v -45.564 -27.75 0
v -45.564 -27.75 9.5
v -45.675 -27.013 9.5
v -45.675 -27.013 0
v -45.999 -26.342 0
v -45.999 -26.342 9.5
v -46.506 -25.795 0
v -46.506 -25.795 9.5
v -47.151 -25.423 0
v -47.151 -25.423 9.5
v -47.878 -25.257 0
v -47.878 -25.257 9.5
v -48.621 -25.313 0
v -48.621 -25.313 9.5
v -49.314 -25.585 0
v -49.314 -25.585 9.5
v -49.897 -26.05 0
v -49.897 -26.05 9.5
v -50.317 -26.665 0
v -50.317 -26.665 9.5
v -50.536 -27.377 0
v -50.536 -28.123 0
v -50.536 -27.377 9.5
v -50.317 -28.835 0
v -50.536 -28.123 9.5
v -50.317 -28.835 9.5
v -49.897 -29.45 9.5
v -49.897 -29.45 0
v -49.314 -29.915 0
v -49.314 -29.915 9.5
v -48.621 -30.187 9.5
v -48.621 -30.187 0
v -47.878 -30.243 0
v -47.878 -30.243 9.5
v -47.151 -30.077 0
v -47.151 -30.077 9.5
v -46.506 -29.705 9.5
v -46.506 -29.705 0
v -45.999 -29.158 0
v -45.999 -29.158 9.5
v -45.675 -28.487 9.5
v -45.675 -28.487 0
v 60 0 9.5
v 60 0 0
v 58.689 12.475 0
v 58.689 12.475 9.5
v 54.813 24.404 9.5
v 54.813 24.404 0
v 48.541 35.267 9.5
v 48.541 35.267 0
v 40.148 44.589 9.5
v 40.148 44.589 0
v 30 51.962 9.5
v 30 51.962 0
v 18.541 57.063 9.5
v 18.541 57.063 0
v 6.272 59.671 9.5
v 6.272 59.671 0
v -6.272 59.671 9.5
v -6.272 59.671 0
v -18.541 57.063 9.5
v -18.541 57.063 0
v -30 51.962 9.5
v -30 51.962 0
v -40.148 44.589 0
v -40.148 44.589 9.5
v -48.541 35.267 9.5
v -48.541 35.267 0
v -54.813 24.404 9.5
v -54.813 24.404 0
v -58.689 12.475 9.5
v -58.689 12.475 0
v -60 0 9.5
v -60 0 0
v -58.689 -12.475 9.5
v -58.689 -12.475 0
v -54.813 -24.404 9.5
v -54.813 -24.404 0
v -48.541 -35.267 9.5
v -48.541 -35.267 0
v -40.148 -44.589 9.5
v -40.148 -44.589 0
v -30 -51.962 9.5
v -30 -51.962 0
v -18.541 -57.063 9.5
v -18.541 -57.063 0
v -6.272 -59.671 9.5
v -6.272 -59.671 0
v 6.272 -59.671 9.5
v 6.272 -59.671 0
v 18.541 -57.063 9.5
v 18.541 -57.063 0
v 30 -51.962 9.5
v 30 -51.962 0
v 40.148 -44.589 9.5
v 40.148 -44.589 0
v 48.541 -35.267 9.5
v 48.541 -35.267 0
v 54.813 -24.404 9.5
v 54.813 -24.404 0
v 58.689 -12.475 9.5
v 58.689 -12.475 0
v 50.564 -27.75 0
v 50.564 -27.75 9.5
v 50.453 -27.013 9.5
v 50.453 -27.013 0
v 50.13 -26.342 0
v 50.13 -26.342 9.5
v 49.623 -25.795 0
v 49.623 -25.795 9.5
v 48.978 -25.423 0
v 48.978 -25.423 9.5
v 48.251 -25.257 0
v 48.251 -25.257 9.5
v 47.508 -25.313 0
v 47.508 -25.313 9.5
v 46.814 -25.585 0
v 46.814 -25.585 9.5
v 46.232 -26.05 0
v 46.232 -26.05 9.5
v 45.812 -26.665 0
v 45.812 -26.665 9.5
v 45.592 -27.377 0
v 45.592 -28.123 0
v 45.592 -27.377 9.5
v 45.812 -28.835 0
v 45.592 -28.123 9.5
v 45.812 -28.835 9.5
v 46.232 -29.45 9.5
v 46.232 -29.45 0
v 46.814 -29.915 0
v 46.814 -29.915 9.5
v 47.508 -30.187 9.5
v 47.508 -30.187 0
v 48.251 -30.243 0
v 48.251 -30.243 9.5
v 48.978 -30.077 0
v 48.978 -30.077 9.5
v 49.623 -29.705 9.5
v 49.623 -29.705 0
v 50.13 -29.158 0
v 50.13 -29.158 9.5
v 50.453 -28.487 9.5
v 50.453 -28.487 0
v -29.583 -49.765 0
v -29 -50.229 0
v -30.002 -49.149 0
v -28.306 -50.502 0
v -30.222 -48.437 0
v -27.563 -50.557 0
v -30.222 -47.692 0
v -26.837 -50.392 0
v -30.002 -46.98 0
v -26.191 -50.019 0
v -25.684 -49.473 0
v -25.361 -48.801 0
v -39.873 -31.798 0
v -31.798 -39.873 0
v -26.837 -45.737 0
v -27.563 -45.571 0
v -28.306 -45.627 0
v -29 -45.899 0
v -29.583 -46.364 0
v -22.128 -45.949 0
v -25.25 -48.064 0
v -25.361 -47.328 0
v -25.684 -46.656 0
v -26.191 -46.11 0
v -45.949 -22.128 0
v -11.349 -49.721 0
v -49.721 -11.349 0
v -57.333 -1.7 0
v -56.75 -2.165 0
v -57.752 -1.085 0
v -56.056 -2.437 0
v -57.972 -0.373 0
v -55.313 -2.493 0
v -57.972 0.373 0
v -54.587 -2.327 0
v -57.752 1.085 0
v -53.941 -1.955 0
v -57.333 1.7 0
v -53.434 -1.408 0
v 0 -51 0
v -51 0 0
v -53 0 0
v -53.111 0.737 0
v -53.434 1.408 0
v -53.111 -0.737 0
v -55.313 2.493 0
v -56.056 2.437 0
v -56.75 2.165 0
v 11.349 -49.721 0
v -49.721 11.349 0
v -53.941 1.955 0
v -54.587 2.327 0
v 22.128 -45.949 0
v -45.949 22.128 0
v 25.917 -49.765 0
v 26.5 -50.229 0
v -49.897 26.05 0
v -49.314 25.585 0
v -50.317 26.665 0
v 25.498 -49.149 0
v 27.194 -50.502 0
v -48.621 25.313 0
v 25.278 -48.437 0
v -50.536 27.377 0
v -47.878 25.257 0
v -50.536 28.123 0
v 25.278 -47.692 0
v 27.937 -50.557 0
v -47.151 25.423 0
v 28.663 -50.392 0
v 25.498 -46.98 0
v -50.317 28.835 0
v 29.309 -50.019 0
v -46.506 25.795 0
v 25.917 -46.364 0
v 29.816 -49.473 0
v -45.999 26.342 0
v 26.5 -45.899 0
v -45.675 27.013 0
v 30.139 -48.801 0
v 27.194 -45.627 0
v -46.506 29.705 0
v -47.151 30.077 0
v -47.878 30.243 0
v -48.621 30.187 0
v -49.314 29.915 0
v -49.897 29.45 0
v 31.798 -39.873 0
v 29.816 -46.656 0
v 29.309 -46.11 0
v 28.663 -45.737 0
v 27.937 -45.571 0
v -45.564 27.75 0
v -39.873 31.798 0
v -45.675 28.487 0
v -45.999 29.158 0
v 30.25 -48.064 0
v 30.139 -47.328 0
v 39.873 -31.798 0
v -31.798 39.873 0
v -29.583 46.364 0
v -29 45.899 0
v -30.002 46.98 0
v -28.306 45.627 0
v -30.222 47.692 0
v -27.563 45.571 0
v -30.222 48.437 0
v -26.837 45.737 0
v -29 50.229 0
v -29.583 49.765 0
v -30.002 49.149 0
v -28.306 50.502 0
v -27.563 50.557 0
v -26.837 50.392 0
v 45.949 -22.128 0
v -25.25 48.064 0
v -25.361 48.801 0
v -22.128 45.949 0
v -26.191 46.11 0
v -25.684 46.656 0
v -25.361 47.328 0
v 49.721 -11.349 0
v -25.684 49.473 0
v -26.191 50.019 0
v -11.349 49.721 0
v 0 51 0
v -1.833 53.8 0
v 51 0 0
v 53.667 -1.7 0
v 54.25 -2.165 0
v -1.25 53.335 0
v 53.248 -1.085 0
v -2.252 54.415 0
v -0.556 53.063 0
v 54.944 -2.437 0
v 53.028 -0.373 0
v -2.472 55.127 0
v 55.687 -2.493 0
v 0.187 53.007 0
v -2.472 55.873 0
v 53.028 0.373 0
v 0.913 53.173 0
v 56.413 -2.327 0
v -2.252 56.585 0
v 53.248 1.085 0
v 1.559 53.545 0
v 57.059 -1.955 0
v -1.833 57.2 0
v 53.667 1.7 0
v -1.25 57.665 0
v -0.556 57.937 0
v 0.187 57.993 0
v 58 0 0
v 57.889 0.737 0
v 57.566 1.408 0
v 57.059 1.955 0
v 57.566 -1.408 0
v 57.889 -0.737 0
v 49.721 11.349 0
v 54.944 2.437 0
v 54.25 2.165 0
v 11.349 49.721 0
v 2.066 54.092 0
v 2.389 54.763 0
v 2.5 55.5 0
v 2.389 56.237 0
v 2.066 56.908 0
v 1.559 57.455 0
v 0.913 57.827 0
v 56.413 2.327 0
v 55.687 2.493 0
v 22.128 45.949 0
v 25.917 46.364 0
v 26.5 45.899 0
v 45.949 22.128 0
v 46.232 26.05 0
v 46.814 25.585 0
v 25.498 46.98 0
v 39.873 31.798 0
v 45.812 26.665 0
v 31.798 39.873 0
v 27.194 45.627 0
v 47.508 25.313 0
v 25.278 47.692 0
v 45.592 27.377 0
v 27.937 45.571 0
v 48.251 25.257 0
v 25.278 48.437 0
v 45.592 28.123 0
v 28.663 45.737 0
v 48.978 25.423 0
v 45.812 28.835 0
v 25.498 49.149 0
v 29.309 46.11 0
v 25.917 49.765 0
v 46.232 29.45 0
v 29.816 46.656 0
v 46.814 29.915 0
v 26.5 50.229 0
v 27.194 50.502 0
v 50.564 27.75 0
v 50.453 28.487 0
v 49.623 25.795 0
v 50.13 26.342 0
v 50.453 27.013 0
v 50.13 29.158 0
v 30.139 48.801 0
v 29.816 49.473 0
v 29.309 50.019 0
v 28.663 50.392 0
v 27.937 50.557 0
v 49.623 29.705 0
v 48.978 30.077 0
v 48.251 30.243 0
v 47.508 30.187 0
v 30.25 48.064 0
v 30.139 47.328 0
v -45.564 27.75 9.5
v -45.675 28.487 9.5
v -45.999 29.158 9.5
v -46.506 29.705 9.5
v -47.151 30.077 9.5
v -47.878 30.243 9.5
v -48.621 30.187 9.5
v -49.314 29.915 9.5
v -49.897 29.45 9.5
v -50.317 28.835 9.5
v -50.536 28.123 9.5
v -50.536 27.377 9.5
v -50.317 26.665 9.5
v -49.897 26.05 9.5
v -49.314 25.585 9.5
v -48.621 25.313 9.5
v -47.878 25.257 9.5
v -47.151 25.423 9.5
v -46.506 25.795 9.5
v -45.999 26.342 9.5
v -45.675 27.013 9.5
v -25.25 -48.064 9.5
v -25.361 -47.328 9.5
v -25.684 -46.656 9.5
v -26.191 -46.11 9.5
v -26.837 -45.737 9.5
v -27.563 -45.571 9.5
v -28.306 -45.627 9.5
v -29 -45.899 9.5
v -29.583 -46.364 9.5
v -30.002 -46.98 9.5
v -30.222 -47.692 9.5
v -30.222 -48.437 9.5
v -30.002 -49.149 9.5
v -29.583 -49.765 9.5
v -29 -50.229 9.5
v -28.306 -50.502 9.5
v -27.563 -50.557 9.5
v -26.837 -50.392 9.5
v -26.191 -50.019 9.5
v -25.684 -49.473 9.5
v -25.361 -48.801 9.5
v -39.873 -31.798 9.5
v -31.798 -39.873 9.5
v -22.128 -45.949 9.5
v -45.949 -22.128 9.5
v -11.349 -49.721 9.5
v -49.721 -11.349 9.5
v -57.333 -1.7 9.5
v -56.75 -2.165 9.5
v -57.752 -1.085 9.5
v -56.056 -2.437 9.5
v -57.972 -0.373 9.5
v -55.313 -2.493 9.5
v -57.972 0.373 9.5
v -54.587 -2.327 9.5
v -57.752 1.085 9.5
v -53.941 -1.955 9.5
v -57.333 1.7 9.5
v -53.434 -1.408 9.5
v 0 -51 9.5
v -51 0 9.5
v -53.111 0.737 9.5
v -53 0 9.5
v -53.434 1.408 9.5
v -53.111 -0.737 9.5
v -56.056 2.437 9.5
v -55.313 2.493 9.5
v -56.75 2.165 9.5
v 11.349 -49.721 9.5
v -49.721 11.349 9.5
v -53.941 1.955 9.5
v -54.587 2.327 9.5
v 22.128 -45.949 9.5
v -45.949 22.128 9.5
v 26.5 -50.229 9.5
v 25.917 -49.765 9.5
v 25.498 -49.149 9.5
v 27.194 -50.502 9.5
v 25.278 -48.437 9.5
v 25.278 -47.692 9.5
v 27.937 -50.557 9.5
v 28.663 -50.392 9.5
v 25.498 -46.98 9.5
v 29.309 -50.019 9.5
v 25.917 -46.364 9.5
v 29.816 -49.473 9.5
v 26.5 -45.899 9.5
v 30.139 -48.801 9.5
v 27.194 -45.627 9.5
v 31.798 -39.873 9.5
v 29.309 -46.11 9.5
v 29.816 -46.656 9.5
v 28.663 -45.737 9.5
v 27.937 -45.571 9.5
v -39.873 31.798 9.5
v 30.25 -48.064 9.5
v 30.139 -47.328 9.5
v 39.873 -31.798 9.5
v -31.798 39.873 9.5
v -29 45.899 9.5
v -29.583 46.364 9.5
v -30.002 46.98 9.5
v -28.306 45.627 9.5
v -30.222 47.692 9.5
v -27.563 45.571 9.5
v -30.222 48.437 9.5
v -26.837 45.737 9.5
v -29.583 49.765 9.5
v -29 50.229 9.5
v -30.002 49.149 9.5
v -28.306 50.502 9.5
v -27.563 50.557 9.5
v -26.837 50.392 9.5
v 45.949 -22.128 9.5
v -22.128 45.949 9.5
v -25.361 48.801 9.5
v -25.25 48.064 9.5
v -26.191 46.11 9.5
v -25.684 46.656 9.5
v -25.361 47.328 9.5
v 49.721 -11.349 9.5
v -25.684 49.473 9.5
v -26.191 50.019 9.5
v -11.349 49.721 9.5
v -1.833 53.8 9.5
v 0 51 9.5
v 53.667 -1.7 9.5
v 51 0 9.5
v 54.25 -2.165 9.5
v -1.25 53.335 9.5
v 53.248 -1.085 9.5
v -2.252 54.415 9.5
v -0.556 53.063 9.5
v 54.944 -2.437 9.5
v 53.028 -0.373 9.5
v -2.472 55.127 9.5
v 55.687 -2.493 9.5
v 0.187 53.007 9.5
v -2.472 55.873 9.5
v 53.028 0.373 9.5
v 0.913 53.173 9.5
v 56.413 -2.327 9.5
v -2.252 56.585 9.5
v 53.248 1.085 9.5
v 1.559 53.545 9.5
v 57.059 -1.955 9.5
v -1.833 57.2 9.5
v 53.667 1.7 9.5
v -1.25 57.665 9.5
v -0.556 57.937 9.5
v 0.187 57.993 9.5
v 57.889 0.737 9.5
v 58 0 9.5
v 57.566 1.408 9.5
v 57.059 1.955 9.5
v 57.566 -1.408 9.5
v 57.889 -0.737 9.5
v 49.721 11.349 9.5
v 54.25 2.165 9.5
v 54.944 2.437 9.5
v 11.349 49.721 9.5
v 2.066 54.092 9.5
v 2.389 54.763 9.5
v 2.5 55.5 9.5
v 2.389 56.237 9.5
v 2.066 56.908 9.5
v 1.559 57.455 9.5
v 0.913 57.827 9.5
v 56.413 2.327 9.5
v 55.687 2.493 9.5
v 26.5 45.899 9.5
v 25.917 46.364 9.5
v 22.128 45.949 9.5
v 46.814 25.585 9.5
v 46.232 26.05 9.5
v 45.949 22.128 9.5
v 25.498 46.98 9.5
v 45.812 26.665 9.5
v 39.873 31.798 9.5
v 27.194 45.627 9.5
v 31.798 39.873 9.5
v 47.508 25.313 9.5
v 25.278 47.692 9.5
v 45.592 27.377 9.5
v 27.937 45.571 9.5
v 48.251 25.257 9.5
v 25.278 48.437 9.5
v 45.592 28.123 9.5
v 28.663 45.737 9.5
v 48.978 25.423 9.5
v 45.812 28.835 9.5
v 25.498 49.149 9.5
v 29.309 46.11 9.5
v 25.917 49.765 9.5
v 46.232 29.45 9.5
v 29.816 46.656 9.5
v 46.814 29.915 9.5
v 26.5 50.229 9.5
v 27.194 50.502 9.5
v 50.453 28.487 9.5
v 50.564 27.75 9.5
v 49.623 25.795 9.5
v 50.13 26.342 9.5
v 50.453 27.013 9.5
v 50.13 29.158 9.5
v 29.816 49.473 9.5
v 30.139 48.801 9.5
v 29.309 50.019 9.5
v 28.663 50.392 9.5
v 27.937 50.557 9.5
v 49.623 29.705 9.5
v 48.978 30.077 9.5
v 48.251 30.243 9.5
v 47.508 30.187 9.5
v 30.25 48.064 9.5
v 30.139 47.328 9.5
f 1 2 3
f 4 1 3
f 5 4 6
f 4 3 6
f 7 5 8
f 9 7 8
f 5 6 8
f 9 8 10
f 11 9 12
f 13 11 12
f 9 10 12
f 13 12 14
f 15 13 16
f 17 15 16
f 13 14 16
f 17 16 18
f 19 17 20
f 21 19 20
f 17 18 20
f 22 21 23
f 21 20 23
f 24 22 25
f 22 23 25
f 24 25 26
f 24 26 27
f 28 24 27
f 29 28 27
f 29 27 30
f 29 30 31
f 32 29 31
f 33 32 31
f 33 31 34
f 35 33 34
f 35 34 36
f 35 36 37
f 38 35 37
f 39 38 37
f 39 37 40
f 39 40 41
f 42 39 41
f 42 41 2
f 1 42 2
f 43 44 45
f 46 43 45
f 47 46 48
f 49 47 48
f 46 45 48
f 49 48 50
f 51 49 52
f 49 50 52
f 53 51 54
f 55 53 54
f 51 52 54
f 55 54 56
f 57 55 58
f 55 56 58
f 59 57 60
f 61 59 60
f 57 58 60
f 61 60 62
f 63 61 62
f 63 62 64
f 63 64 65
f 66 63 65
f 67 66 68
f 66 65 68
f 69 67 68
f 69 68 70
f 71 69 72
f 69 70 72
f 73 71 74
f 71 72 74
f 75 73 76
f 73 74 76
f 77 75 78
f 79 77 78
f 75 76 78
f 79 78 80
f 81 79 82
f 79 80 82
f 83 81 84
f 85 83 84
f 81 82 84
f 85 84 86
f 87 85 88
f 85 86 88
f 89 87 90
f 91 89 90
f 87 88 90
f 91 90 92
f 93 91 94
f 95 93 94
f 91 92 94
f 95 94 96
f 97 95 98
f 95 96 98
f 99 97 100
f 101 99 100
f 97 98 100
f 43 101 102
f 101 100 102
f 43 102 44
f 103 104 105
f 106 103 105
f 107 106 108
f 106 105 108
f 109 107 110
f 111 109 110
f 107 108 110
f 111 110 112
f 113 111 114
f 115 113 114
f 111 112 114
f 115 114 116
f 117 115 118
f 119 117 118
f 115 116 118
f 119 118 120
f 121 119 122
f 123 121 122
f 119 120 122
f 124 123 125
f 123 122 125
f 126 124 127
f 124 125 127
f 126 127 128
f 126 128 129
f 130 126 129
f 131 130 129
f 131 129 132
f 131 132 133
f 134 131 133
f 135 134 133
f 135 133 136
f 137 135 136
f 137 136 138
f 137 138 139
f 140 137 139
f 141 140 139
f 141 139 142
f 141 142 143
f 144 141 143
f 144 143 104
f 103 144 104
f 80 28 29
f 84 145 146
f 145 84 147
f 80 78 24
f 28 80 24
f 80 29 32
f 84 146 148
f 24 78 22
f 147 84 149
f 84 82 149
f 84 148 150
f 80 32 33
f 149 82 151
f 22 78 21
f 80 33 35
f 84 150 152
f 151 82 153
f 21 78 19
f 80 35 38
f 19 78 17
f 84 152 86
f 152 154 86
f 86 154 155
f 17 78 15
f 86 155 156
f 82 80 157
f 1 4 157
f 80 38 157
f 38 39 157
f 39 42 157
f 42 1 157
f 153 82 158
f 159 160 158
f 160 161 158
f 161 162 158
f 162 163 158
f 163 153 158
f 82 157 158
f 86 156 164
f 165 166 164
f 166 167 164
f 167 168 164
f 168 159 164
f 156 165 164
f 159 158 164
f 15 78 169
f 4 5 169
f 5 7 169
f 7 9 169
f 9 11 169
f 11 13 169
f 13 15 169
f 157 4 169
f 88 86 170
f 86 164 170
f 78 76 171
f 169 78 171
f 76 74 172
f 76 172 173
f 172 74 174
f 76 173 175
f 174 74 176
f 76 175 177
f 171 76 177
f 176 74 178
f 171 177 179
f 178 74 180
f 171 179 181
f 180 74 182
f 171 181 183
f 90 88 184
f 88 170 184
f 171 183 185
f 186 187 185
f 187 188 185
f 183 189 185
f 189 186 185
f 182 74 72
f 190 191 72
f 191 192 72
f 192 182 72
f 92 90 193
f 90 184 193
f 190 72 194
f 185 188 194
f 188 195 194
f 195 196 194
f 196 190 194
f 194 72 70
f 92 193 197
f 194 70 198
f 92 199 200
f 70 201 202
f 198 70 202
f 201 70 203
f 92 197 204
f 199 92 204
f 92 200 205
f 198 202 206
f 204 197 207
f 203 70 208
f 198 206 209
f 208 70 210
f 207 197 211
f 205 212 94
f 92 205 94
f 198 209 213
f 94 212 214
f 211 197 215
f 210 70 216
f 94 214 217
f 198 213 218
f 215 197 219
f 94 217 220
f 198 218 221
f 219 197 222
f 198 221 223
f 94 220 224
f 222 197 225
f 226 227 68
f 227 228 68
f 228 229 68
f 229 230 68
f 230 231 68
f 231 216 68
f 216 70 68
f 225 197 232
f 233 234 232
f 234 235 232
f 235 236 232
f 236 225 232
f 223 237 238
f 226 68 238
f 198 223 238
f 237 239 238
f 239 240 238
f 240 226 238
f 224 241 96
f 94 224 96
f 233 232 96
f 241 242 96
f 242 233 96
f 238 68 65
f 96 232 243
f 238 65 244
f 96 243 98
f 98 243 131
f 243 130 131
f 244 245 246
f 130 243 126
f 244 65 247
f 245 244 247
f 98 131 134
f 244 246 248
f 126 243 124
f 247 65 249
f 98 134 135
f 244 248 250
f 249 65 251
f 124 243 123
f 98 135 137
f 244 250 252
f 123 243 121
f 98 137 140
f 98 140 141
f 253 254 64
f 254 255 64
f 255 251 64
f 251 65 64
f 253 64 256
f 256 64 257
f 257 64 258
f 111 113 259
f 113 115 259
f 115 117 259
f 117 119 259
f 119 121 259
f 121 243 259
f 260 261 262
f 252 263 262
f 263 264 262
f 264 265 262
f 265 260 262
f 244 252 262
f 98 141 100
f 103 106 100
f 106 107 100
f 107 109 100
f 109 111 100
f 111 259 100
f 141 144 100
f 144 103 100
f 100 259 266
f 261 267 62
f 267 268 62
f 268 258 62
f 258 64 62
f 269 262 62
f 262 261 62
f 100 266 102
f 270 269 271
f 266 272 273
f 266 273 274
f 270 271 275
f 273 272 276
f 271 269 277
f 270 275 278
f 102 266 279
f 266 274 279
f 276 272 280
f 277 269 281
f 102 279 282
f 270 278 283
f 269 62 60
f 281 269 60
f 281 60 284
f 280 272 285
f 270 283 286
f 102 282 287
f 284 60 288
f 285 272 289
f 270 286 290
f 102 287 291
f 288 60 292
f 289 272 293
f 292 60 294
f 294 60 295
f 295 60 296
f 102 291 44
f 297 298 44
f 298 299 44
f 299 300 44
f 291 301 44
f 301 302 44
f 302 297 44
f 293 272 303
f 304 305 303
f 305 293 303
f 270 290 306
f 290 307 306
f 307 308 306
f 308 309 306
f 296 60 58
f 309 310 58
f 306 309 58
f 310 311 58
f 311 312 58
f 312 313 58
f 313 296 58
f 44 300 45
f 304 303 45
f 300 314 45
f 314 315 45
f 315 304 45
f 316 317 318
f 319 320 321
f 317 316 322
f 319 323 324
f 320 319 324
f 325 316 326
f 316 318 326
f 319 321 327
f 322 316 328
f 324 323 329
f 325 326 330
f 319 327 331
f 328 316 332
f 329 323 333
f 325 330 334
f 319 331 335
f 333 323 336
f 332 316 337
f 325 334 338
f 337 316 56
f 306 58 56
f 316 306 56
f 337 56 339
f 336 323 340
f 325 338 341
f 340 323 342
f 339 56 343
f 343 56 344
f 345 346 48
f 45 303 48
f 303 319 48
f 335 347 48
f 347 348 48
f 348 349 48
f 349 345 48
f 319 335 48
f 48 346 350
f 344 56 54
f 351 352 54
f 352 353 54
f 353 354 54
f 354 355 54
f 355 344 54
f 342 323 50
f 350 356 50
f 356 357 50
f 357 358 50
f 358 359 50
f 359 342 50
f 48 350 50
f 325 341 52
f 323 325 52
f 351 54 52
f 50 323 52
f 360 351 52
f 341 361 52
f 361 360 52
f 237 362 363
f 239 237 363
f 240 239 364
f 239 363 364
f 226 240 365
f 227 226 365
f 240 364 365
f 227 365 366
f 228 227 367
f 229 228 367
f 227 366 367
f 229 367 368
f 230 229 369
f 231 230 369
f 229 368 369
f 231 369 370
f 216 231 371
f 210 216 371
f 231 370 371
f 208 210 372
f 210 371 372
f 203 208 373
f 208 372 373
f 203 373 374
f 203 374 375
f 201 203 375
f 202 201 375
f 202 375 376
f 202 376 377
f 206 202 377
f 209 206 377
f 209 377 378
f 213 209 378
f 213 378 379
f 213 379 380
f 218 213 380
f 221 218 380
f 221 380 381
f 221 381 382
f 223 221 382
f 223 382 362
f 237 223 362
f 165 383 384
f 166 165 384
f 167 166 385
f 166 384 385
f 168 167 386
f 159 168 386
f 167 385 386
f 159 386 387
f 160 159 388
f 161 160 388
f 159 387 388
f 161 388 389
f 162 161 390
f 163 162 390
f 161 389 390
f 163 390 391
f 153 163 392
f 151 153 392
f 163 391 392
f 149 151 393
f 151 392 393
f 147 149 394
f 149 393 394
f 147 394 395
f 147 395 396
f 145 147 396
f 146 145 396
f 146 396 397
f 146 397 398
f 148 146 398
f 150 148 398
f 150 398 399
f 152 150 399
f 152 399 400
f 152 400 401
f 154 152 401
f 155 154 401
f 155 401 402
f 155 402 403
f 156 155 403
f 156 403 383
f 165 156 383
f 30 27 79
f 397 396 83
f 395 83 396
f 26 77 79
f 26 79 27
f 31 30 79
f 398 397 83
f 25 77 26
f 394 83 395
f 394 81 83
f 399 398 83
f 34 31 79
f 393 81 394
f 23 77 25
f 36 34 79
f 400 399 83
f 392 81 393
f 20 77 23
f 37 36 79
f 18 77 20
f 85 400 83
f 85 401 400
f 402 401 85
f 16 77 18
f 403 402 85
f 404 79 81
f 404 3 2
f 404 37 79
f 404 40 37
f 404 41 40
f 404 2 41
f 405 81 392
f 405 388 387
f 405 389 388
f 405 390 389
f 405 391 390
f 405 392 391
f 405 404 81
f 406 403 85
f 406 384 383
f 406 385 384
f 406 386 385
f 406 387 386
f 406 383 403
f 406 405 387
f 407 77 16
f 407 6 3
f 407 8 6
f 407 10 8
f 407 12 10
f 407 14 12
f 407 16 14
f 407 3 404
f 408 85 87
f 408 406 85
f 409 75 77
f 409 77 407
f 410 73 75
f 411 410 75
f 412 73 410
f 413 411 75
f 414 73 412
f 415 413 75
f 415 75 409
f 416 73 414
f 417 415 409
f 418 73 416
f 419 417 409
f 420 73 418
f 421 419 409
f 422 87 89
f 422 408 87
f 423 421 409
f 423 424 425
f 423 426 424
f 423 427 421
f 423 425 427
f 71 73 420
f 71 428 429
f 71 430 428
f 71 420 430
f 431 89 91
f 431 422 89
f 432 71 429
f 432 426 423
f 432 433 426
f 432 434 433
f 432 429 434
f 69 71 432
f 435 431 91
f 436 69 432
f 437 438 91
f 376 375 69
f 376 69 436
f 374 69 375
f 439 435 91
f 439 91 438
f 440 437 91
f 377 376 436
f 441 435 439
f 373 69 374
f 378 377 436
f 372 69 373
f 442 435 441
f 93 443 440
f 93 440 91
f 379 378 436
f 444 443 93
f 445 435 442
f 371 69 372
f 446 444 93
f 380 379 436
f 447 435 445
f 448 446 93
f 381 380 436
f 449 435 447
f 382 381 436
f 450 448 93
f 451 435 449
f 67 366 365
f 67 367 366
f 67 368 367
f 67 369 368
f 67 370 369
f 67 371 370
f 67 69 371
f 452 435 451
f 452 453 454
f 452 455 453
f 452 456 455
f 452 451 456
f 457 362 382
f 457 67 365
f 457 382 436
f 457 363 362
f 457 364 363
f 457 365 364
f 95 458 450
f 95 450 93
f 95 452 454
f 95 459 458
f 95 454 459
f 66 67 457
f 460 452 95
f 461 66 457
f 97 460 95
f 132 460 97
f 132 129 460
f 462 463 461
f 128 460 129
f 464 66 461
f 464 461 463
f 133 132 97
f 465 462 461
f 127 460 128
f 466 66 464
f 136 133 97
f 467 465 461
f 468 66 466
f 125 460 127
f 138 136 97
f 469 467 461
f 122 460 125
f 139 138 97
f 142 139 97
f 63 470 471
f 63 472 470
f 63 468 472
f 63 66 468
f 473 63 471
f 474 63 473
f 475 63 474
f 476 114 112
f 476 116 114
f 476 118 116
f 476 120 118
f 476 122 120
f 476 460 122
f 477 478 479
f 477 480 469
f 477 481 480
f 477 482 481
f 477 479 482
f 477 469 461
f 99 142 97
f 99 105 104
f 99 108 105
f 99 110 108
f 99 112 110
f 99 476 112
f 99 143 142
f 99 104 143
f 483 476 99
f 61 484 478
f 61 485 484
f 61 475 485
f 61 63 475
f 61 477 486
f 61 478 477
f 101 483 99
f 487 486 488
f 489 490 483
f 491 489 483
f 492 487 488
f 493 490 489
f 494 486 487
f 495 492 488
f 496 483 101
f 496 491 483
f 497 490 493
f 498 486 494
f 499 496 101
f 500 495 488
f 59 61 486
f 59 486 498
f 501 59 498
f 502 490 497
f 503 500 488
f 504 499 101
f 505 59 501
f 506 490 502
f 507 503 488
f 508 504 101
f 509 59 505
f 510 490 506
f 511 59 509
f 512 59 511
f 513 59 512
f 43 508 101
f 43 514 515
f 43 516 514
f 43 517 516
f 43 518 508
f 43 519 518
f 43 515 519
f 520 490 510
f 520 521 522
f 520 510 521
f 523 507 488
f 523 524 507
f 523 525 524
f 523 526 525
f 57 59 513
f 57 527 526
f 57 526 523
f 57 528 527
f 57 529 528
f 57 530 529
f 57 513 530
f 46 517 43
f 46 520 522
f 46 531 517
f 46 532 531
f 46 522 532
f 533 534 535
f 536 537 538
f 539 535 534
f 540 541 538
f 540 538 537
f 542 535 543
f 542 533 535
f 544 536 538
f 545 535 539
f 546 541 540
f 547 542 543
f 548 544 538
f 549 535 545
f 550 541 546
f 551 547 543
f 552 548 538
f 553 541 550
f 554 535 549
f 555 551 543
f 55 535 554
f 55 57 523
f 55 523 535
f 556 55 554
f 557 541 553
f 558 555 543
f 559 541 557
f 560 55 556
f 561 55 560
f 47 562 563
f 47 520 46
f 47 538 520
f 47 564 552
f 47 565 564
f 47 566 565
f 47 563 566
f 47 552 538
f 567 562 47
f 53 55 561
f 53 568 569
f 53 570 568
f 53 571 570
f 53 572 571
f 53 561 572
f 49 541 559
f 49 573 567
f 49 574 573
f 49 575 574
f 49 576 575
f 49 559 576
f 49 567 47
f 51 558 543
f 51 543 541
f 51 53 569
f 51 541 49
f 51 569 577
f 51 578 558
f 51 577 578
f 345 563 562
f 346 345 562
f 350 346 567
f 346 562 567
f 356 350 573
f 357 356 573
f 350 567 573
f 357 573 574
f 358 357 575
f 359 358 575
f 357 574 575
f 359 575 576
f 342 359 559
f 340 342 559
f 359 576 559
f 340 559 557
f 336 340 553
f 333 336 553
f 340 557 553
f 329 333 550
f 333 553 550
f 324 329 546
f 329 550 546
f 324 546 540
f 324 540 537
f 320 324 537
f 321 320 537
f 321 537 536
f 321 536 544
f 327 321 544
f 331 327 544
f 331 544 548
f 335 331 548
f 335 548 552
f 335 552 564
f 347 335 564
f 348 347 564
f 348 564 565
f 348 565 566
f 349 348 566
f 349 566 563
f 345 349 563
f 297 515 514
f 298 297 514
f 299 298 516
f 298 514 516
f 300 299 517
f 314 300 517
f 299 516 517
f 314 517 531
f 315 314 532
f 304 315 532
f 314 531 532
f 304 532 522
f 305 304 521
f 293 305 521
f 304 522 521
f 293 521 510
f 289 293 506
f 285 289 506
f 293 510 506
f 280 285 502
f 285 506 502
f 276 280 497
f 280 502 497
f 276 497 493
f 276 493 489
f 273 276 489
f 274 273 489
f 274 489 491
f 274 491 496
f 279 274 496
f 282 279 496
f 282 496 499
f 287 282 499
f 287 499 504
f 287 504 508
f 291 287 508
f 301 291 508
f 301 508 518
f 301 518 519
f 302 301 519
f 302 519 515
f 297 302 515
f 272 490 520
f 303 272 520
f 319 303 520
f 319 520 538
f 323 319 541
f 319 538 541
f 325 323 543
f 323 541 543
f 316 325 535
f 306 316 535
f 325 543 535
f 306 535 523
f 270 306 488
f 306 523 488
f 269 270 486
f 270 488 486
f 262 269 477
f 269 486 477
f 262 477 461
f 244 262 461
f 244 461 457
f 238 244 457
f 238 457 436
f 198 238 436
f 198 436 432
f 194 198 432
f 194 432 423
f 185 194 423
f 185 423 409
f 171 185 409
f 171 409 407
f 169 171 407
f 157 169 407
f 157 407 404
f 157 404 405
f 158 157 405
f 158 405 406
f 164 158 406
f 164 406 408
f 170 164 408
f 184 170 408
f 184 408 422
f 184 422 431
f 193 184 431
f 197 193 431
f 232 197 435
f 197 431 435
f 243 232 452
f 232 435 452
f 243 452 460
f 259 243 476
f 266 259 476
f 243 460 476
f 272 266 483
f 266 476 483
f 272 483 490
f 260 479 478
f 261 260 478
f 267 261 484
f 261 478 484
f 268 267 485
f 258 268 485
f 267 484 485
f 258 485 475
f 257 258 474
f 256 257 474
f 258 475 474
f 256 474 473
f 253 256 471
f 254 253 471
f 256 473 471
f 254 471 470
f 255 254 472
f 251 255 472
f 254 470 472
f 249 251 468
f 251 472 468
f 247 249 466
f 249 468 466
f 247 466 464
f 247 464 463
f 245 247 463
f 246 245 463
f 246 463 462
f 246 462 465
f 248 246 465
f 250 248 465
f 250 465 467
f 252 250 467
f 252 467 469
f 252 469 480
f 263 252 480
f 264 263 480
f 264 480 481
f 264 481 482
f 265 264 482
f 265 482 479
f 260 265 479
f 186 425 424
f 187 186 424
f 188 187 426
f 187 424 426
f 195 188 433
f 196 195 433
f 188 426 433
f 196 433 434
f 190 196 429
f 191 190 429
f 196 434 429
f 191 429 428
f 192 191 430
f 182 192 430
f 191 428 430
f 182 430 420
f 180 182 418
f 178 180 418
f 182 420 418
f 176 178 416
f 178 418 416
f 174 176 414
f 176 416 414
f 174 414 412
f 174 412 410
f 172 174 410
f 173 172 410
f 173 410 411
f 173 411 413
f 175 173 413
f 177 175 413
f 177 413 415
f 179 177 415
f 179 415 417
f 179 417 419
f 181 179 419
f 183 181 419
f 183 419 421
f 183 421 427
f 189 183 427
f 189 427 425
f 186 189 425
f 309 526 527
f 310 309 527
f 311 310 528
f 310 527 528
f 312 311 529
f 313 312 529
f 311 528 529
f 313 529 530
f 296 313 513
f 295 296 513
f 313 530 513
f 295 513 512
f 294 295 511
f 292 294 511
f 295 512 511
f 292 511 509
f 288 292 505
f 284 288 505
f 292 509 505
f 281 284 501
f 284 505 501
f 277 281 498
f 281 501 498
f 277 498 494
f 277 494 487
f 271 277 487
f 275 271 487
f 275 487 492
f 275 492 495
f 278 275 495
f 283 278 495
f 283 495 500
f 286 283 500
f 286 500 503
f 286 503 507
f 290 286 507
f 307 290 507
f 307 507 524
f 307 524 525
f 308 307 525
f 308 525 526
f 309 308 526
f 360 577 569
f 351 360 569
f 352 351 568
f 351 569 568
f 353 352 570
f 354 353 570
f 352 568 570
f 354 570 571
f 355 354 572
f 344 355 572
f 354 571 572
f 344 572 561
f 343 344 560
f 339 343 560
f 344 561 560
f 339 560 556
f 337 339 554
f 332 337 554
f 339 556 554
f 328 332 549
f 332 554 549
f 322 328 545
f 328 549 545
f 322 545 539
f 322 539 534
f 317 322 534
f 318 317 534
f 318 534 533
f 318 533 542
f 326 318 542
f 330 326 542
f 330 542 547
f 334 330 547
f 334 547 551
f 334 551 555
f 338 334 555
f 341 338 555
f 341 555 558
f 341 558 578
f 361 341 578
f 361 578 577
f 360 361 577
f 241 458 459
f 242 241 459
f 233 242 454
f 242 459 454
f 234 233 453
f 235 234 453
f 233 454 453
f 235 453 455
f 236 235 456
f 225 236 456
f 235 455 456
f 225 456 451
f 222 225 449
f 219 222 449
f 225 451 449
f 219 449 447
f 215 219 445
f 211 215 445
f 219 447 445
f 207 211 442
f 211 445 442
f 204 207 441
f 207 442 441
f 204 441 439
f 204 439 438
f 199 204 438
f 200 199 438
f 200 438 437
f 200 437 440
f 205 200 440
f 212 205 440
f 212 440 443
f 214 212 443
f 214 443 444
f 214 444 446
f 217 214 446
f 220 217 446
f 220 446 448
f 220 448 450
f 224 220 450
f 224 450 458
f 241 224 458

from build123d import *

# Parameters (mm, degrees)
ESBO_O1_R                = 60
RESSALTO_EXTRUS_O1_DEPTH = 9.5
ESBO_O2_R                = 51
ESBO_O2_R_2              = 2.5
CORTE_EXTRUS_O1_DEPTH    = 10.5


with BuildPart() as part:
    # Esboço1 → Ressalto-extrusão1 (new body)
    with BuildSketch(Plane.XY):
        Circle(ESBO_O1_R)
    extrude(amount=RESSALTO_EXTRUS_O1_DEPTH)

    # Esboço2 → Corte-extrusão1 (cut, through all)
    with BuildSketch(Plane.XY.offset(9.5)):
        Circle(ESBO_O2_R)
        with Locations((0, 55.5)):
            Circle(ESBO_O2_R_2)
        with Locations((27.75, 48.06440991)):
            Circle(ESBO_O2_R_2)
        with Locations((48.06440991, 27.75)):
            Circle(ESBO_O2_R_2)
        with Locations((55.5, 0)):
            Circle(ESBO_O2_R_2)
        with Locations((48.06440991, -27.75)):
            Circle(ESBO_O2_R_2)
        with Locations((27.75, -48.06440991)):
            Circle(ESBO_O2_R_2)
        with Locations((-27.75, -48.06440991)):
            Circle(ESBO_O2_R_2)
        with Locations((-48.06440991, -27.75)):
            Circle(ESBO_O2_R_2)
        with Locations((-55.5, 0)):
            Circle(ESBO_O2_R_2)
        with Locations((-48.06440991, 27.75)):
            Circle(ESBO_O2_R_2)
        with Locations((-27.75, 48.06440991)):
            Circle(ESBO_O2_R_2)
    extrude(amount=-CORTE_EXTRUS_O1_DEPTH, mode=Mode.SUBTRACT)


solid = part.part
